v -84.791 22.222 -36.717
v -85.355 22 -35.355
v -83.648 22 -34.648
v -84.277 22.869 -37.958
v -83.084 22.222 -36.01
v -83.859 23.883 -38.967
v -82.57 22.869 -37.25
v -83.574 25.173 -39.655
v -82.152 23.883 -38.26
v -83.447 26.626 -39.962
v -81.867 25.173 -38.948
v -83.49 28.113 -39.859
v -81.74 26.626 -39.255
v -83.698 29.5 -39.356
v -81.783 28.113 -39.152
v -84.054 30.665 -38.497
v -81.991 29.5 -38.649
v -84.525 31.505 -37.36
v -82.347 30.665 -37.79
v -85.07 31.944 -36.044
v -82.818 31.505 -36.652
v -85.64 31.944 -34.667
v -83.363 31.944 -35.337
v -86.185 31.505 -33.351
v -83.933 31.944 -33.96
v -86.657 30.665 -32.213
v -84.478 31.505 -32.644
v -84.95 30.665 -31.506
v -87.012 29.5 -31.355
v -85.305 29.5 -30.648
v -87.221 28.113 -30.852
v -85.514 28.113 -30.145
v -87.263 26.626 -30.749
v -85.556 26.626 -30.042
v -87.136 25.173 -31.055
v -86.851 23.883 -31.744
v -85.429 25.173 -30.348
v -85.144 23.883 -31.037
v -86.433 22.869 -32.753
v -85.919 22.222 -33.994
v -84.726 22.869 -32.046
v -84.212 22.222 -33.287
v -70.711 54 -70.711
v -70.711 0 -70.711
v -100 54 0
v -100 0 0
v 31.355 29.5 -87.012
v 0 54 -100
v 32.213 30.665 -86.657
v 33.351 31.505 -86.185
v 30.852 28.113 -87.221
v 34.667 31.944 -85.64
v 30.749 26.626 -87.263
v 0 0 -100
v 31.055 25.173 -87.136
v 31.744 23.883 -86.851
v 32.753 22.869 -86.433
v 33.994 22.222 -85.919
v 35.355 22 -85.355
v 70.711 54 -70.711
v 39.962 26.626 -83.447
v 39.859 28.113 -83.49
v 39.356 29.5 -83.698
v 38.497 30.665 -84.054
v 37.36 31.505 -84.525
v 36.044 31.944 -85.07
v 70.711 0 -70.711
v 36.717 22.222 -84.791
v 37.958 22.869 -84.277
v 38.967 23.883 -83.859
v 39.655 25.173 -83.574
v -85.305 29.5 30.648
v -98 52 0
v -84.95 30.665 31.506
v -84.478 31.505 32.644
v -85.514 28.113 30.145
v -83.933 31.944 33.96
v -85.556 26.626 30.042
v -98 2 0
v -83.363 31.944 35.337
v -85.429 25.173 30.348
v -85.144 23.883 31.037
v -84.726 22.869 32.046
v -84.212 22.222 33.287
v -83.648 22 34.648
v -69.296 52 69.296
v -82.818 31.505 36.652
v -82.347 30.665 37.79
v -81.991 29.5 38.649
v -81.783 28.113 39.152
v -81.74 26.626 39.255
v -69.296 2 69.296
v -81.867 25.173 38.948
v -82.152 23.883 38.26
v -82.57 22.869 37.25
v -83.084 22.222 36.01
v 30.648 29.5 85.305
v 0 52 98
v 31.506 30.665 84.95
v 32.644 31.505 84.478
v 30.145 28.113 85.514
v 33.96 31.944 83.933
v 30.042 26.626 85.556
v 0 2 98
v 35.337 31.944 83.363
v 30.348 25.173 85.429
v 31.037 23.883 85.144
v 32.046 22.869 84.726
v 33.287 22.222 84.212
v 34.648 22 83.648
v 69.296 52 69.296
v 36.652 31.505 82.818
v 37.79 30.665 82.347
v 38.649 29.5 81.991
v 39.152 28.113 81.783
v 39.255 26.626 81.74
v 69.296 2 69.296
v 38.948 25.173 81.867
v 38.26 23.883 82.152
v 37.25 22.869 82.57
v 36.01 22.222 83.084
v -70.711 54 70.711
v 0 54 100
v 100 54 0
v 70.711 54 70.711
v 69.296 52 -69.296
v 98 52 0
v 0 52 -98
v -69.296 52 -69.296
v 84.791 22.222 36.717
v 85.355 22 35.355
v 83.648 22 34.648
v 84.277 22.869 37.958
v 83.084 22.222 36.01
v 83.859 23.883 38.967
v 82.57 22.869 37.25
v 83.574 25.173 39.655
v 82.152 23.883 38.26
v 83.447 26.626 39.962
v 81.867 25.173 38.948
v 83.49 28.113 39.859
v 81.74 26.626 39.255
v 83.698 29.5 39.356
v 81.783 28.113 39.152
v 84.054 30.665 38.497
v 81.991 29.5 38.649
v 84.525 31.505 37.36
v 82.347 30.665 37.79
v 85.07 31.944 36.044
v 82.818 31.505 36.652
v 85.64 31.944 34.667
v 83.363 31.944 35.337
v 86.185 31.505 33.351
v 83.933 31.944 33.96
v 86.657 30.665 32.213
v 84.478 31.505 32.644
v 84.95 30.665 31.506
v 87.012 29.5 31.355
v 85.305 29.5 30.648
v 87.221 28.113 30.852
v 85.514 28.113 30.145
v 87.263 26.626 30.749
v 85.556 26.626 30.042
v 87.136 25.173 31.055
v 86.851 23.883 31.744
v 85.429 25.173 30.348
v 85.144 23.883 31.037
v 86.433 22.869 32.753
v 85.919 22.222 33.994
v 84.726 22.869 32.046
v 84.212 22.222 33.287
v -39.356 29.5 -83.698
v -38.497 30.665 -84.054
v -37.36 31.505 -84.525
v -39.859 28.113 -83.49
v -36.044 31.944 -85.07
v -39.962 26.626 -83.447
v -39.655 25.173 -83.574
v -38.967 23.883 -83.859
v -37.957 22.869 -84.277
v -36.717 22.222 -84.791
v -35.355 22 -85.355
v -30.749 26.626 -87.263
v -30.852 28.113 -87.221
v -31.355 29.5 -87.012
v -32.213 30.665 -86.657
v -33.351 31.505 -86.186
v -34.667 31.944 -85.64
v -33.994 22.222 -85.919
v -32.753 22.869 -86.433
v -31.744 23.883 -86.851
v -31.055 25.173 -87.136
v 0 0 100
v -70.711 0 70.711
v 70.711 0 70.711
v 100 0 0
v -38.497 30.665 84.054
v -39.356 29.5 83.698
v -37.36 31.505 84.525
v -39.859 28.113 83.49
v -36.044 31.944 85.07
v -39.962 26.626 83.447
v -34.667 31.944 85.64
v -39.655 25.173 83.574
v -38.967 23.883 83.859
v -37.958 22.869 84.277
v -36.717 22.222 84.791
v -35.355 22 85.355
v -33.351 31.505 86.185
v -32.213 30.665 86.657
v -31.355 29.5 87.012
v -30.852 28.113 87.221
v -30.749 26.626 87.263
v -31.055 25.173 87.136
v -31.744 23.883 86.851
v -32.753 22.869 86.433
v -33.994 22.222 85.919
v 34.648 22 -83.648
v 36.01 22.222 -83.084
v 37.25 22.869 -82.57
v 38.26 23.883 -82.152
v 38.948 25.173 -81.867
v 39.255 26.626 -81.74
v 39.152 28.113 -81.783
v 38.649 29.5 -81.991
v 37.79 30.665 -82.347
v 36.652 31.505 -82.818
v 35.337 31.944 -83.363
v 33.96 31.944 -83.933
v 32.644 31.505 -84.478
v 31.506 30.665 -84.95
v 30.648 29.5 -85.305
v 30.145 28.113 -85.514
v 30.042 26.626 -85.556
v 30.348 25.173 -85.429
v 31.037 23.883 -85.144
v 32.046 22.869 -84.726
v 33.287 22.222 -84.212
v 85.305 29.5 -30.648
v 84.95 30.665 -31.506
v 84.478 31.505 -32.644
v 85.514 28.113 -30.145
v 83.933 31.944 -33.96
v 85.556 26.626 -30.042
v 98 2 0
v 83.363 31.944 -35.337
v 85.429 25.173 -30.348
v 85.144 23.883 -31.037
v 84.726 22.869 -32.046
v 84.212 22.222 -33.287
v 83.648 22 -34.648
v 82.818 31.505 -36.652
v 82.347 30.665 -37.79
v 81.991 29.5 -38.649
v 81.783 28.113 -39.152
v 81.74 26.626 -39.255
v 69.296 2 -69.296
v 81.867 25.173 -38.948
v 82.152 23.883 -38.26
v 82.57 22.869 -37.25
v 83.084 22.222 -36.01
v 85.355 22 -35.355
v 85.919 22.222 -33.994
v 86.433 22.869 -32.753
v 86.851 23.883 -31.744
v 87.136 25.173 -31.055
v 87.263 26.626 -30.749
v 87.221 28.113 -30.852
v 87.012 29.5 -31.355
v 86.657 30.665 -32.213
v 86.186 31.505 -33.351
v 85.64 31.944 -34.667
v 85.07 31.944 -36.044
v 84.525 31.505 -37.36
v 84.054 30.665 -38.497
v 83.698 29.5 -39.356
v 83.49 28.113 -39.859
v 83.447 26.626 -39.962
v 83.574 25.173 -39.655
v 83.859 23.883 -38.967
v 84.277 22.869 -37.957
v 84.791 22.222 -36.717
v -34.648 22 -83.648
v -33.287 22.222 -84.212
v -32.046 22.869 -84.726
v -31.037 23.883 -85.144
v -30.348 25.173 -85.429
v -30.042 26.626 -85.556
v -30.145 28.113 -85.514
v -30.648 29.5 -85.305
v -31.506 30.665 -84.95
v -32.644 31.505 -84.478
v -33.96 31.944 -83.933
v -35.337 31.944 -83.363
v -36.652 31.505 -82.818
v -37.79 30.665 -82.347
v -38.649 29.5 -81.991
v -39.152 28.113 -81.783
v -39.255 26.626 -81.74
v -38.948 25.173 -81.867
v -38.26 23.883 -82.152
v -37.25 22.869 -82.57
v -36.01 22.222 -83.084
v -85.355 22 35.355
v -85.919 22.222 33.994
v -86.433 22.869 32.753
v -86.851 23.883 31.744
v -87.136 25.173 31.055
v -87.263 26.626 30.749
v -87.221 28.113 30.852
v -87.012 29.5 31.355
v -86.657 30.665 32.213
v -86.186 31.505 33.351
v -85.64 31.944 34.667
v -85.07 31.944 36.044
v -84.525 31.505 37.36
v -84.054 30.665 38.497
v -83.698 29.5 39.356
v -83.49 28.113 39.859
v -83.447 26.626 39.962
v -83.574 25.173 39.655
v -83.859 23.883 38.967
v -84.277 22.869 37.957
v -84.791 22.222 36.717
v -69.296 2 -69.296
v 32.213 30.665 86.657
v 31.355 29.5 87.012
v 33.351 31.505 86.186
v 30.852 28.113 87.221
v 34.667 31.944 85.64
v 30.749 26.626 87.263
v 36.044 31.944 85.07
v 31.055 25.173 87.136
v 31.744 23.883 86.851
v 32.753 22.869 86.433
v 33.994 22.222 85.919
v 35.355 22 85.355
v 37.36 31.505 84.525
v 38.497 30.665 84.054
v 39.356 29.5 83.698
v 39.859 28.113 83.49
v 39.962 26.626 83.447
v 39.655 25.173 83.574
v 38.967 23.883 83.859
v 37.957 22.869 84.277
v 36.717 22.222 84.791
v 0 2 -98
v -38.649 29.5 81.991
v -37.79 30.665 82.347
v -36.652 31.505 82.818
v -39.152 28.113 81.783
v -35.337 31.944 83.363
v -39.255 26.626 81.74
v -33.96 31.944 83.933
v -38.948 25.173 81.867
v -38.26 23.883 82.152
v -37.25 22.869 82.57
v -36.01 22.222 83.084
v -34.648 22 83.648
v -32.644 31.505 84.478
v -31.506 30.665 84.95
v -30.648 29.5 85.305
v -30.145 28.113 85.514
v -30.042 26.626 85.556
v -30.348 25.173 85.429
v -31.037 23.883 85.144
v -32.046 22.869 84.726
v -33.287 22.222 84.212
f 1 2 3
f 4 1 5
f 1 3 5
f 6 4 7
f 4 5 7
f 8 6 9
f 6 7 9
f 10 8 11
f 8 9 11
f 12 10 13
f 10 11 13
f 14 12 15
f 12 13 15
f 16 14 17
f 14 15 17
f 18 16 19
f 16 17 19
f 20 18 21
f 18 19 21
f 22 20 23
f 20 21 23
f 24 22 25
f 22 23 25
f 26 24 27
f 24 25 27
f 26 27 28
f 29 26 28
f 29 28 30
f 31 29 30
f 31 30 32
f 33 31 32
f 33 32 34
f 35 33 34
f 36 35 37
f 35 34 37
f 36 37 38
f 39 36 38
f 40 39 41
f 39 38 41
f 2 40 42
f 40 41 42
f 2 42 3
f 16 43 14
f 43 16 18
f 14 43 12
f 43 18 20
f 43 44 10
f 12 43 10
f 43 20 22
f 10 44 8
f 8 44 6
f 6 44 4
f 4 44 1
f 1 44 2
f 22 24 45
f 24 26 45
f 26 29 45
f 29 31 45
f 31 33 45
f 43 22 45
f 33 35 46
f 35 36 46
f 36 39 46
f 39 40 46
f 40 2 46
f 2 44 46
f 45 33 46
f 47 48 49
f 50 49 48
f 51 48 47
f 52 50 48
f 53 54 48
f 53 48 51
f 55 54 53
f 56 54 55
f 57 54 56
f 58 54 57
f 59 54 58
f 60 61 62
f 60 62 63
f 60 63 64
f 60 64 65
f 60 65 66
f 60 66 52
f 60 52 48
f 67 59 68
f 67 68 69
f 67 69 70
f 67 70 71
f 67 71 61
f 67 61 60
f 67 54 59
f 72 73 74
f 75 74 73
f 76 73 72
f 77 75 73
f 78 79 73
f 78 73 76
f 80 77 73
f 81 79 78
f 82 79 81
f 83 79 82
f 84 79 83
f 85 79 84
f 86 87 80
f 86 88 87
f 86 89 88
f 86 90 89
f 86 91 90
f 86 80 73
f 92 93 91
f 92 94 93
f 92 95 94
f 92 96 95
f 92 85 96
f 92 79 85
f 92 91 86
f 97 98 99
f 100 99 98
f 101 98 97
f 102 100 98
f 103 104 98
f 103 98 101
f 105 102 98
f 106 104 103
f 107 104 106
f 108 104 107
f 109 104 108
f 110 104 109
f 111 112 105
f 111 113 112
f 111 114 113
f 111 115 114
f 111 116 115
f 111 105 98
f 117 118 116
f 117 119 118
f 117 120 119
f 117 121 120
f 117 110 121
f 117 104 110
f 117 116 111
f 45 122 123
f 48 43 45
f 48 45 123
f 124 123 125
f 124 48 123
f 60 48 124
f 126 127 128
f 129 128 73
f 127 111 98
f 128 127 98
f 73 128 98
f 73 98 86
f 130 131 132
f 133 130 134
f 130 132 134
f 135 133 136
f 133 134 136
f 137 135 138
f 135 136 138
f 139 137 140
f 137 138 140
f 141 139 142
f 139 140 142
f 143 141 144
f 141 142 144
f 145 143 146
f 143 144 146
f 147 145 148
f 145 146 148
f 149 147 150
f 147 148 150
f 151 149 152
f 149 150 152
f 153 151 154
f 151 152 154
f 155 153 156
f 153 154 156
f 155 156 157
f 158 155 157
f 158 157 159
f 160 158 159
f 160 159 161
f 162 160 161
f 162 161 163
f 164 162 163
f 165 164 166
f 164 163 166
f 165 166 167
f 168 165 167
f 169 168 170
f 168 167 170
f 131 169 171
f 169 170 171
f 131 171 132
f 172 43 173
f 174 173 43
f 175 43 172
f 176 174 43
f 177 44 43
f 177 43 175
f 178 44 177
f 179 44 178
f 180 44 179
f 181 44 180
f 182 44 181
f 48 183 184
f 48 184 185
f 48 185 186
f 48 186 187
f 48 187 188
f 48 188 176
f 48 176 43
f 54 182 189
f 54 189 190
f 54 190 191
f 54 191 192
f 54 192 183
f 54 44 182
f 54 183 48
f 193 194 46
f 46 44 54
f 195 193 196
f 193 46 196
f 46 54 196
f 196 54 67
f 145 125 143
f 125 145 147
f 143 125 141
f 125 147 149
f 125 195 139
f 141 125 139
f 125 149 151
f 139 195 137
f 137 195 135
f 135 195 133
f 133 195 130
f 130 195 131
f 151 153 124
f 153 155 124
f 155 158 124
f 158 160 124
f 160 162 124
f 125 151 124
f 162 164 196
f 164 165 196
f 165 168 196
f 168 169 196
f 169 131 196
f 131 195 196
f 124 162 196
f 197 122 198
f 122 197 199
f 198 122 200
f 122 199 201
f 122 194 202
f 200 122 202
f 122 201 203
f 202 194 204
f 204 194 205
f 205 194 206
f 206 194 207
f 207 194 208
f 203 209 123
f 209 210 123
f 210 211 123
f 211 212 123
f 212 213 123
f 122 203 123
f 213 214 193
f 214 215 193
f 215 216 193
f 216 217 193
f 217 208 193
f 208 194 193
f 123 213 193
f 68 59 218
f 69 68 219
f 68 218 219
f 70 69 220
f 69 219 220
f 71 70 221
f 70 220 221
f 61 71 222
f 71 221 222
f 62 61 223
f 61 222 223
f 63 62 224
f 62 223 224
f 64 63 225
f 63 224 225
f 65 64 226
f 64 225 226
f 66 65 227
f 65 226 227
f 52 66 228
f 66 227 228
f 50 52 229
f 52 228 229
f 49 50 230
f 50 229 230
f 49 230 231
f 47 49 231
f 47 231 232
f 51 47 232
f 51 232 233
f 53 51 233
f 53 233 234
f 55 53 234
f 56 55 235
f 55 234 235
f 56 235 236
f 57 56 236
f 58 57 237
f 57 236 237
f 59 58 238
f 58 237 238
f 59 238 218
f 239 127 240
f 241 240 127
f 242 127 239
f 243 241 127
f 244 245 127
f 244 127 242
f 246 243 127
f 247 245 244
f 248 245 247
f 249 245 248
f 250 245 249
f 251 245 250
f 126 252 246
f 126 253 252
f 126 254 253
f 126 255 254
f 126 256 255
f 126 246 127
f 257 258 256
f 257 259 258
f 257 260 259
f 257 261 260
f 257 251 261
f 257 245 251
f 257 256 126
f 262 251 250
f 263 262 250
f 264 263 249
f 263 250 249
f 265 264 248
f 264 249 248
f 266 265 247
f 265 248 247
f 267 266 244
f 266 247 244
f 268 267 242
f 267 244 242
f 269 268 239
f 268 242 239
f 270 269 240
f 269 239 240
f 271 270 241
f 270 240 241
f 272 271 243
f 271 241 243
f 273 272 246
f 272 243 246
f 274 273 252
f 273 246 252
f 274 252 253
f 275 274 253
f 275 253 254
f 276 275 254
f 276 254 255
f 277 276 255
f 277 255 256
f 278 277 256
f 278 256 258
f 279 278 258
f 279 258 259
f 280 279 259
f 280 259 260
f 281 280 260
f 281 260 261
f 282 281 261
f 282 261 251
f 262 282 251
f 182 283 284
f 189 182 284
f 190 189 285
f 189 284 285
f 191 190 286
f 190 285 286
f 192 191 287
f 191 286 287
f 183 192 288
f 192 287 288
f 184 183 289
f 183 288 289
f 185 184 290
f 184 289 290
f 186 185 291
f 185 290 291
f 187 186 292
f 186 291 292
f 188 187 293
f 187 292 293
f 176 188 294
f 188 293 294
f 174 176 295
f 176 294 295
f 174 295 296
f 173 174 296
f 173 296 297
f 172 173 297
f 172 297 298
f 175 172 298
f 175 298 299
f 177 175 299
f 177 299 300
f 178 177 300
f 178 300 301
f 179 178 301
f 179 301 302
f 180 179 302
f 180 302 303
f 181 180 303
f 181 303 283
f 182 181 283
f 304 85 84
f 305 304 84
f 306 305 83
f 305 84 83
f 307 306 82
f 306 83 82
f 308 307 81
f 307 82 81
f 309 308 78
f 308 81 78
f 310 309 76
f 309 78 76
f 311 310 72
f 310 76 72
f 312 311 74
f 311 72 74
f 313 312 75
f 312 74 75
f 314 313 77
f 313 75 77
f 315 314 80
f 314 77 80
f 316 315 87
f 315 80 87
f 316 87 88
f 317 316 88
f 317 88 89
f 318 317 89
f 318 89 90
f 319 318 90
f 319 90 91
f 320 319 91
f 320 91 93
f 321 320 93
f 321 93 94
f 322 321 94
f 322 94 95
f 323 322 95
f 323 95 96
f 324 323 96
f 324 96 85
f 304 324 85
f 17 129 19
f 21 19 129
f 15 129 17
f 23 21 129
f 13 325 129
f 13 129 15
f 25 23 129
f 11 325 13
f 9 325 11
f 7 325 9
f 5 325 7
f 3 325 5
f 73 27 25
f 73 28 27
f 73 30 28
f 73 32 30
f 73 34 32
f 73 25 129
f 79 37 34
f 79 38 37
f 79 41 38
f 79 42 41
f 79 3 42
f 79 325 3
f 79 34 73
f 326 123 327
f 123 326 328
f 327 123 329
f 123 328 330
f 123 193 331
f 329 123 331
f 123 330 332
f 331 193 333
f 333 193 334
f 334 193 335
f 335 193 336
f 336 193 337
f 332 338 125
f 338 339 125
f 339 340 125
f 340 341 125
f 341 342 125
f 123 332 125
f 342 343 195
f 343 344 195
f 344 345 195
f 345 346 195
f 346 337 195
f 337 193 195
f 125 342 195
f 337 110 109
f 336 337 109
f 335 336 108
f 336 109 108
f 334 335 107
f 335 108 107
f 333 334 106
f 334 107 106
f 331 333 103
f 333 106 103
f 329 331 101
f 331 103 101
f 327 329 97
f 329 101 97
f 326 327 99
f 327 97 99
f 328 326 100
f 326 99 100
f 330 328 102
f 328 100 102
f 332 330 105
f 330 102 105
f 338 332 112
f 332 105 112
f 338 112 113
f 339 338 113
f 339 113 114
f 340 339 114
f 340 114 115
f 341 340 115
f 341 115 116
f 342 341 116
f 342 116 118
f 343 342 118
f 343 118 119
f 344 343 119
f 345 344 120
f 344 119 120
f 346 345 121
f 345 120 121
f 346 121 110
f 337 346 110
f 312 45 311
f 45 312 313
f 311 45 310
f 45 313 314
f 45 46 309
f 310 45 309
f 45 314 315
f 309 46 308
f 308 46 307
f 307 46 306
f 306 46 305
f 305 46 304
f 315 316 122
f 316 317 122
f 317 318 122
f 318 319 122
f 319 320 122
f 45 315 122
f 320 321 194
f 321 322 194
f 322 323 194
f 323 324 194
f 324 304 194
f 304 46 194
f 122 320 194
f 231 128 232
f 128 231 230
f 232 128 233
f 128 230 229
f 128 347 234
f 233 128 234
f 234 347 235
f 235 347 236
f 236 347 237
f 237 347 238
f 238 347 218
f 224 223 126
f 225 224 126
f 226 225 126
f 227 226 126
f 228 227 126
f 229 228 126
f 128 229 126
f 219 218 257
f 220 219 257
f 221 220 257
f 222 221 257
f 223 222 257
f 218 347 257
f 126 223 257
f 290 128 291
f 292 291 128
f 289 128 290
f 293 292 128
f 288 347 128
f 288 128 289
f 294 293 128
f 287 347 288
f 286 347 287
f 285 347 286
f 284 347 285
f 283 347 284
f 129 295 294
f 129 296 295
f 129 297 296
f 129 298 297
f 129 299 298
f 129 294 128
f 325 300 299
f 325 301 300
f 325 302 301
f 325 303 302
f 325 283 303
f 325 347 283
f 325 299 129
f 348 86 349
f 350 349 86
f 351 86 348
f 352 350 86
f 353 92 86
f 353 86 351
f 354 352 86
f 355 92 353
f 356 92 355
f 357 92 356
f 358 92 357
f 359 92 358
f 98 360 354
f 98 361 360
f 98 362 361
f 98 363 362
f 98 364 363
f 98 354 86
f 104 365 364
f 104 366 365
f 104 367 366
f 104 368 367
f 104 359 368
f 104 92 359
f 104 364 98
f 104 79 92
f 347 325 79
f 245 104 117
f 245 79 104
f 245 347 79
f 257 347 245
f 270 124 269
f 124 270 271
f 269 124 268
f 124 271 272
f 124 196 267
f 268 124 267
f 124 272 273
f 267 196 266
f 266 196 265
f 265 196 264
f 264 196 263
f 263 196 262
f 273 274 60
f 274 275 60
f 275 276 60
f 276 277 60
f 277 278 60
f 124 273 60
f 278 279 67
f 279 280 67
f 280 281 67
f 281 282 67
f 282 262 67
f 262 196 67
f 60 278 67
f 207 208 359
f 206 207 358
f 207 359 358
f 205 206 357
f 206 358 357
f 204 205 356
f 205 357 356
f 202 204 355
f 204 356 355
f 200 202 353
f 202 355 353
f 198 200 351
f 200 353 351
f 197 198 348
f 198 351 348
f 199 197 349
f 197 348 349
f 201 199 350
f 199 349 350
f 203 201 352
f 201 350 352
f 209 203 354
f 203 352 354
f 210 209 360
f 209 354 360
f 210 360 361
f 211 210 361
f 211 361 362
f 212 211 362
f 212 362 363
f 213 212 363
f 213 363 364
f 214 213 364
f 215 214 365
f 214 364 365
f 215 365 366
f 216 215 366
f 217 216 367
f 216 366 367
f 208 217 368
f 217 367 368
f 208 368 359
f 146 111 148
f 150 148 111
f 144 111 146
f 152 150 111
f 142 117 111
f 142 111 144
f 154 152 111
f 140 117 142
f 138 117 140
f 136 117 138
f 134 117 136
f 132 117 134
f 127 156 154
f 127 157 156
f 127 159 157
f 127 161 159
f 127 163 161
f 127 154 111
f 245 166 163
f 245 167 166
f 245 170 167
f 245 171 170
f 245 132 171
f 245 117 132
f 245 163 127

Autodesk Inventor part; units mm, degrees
ref_plane "YZ Plane" through (0, 0, 0) normal (1, 0, 0) x (0, 1, 0)
ref_plane "XY Plane" through (0, 0, 0) normal (0, 0, 1) x (1, 0, 0)
sketch "Sketch1" plane through (0, 0, 0) normal (0, 1, 0) x (1, 0, 0)
  line L0 (70.7107, 70.7107) -> (-70.7107, -70.7107) construction
  line L1 (-70.7107, 70.7107) -> (70.7107, -70.7107) construction
  line L2 (-140, 0) -> (140, 0) construction
  line L3 (0, -140) -> (0, 140) construction
  line L4 (100, 0) -> (70.7107, 70.7107)
  line L5 (0, 100) -> (70.7107, 70.7107)
  line L6 (-70.7107, 70.7107) -> (0, 100)
  line L7 (-70.7107, 70.7107) -> (-100, 0)
  line L8 (-100, 0) -> (-70.7107, -70.7107)
  line L9 (-70.7107, -70.7107) -> (0, -100)
  line L10 (0, -100) -> (70.7107, -70.7107)
  line L11 (70.7107, -70.7107) -> (100, 0)
  line L12 (0, 100) -> (0, -100) construction
  line L13 (-100, 0) -> (100, 0) construction
  line L14 (98, 0) -> (69.2965, 69.2965)
  line L15 (0, 98) -> (69.2965, 69.2965)
  line L16 (0, 98) -> (-69.2965, 69.2965)
  line L17 (-69.2965, 69.2965) -> (-98, 0)
  line L18 (-98, 0) -> (-69.2965, -69.2965)
  line L19 (-69.2965, -69.2965) -> (0, -98)
  line L20 (0, -98) -> (69.2965, -69.2965)
  line L21 (69.2965, -69.2965) -> (98, 0)
  point P0 (0, 0)
  point P1 (0, 0)
  dimension "d0" = 45
  dimension "d3" = 200
  dimension "d6" = 2
extrude "Extrusion1" add sketch "Sketch1" along normal blind 54
extrude "Extrusion2" add sketch "Sketch1" along normal blind 2 contours L11 L10 L9 L8 L7 L6 L5 L4 | L21 L20 L19 L18 L17 L16 L15 L14
ref_plane "Work Plane4" through (-100, 54, 0) normal (0, 1, 0) x (-1, 0, 0)
sketch "Sketch3" plane through (-100, 54, 0) normal (0, 1, 0) x (-1, 0, 0)
  line L0 (-29.2893, -70.7107) -> (0, 0) projected
  line L1 (-100, -100) -> (-29.2893, -70.7107) projected
  line L2 (-170.7107, -70.7107) -> (-100, -100) projected
  line L3 (-200, 0) -> (-170.7107, -70.7107) projected
  line L4 (-170.7107, 70.7107) -> (-200, 0) projected
  line L5 (-100, 100) -> (-170.7107, 70.7107) projected
  line L6 (-29.2893, 70.7107) -> (-100, 100) projected
  line L7 (0, 0) -> (-29.2893, 70.7107) projected
  point P0 (-100, 0)
extrude "Extrusion4" add sketch "Sketch3" against normal blind 2
sketch "Sketch4" plane through (0, 0, 100) normal (0.3826834, 0, 0.9238795) x (0.9238795, 0, -0.3826834)
  line L0 (76.5367, 54) -> (0, 54) projected
  line L1 (38.2683, 54) -> (38.2683, 0) construction
  line L2 (76.5367, 0) -> (0, 0) projected
  line L3 (75.7713, 2) -> (0.7654, 2) construction
  point P0 (38.2683, 27)
  dimension "d15" = 25
hole "Hole1" at (35.3553, 27, 85.3553) direction (-0.3826834, 0, -0.9238795) diameter 10 depth 1.8478
pattern_circular "Circular Pattern1" count 8 over 360 about axis through (0, -10, 0) along (0, 1, 0) of "Hole1"
equation "\"d3\" = diameter"
equation "\"d6\" = thickness"
equation "\"d7\" = outher_heigth"
equation "\"d9\" = thickness"
equation "\"d13\" = thickness"
equation "\"d15\" = hole_pos_y"
equation "\"d16\" = hole_diameter"
equation "\"diameter\" = 200"
equation "\"inner_diameter\" = diameter - 2 * thickness"
equation "\"thickness\" = 2"
equation "\"inner_heigth\" = 50"
equation "\"outher_heigth\" = inner_heigth + 2 * thickness"
equation "\"hole_pos_y\" = 0.5 * inner_heigth"
equation "\"hole_diameter\" = 10"
properties part number "board_case" material "PVC, Unplasticized"
